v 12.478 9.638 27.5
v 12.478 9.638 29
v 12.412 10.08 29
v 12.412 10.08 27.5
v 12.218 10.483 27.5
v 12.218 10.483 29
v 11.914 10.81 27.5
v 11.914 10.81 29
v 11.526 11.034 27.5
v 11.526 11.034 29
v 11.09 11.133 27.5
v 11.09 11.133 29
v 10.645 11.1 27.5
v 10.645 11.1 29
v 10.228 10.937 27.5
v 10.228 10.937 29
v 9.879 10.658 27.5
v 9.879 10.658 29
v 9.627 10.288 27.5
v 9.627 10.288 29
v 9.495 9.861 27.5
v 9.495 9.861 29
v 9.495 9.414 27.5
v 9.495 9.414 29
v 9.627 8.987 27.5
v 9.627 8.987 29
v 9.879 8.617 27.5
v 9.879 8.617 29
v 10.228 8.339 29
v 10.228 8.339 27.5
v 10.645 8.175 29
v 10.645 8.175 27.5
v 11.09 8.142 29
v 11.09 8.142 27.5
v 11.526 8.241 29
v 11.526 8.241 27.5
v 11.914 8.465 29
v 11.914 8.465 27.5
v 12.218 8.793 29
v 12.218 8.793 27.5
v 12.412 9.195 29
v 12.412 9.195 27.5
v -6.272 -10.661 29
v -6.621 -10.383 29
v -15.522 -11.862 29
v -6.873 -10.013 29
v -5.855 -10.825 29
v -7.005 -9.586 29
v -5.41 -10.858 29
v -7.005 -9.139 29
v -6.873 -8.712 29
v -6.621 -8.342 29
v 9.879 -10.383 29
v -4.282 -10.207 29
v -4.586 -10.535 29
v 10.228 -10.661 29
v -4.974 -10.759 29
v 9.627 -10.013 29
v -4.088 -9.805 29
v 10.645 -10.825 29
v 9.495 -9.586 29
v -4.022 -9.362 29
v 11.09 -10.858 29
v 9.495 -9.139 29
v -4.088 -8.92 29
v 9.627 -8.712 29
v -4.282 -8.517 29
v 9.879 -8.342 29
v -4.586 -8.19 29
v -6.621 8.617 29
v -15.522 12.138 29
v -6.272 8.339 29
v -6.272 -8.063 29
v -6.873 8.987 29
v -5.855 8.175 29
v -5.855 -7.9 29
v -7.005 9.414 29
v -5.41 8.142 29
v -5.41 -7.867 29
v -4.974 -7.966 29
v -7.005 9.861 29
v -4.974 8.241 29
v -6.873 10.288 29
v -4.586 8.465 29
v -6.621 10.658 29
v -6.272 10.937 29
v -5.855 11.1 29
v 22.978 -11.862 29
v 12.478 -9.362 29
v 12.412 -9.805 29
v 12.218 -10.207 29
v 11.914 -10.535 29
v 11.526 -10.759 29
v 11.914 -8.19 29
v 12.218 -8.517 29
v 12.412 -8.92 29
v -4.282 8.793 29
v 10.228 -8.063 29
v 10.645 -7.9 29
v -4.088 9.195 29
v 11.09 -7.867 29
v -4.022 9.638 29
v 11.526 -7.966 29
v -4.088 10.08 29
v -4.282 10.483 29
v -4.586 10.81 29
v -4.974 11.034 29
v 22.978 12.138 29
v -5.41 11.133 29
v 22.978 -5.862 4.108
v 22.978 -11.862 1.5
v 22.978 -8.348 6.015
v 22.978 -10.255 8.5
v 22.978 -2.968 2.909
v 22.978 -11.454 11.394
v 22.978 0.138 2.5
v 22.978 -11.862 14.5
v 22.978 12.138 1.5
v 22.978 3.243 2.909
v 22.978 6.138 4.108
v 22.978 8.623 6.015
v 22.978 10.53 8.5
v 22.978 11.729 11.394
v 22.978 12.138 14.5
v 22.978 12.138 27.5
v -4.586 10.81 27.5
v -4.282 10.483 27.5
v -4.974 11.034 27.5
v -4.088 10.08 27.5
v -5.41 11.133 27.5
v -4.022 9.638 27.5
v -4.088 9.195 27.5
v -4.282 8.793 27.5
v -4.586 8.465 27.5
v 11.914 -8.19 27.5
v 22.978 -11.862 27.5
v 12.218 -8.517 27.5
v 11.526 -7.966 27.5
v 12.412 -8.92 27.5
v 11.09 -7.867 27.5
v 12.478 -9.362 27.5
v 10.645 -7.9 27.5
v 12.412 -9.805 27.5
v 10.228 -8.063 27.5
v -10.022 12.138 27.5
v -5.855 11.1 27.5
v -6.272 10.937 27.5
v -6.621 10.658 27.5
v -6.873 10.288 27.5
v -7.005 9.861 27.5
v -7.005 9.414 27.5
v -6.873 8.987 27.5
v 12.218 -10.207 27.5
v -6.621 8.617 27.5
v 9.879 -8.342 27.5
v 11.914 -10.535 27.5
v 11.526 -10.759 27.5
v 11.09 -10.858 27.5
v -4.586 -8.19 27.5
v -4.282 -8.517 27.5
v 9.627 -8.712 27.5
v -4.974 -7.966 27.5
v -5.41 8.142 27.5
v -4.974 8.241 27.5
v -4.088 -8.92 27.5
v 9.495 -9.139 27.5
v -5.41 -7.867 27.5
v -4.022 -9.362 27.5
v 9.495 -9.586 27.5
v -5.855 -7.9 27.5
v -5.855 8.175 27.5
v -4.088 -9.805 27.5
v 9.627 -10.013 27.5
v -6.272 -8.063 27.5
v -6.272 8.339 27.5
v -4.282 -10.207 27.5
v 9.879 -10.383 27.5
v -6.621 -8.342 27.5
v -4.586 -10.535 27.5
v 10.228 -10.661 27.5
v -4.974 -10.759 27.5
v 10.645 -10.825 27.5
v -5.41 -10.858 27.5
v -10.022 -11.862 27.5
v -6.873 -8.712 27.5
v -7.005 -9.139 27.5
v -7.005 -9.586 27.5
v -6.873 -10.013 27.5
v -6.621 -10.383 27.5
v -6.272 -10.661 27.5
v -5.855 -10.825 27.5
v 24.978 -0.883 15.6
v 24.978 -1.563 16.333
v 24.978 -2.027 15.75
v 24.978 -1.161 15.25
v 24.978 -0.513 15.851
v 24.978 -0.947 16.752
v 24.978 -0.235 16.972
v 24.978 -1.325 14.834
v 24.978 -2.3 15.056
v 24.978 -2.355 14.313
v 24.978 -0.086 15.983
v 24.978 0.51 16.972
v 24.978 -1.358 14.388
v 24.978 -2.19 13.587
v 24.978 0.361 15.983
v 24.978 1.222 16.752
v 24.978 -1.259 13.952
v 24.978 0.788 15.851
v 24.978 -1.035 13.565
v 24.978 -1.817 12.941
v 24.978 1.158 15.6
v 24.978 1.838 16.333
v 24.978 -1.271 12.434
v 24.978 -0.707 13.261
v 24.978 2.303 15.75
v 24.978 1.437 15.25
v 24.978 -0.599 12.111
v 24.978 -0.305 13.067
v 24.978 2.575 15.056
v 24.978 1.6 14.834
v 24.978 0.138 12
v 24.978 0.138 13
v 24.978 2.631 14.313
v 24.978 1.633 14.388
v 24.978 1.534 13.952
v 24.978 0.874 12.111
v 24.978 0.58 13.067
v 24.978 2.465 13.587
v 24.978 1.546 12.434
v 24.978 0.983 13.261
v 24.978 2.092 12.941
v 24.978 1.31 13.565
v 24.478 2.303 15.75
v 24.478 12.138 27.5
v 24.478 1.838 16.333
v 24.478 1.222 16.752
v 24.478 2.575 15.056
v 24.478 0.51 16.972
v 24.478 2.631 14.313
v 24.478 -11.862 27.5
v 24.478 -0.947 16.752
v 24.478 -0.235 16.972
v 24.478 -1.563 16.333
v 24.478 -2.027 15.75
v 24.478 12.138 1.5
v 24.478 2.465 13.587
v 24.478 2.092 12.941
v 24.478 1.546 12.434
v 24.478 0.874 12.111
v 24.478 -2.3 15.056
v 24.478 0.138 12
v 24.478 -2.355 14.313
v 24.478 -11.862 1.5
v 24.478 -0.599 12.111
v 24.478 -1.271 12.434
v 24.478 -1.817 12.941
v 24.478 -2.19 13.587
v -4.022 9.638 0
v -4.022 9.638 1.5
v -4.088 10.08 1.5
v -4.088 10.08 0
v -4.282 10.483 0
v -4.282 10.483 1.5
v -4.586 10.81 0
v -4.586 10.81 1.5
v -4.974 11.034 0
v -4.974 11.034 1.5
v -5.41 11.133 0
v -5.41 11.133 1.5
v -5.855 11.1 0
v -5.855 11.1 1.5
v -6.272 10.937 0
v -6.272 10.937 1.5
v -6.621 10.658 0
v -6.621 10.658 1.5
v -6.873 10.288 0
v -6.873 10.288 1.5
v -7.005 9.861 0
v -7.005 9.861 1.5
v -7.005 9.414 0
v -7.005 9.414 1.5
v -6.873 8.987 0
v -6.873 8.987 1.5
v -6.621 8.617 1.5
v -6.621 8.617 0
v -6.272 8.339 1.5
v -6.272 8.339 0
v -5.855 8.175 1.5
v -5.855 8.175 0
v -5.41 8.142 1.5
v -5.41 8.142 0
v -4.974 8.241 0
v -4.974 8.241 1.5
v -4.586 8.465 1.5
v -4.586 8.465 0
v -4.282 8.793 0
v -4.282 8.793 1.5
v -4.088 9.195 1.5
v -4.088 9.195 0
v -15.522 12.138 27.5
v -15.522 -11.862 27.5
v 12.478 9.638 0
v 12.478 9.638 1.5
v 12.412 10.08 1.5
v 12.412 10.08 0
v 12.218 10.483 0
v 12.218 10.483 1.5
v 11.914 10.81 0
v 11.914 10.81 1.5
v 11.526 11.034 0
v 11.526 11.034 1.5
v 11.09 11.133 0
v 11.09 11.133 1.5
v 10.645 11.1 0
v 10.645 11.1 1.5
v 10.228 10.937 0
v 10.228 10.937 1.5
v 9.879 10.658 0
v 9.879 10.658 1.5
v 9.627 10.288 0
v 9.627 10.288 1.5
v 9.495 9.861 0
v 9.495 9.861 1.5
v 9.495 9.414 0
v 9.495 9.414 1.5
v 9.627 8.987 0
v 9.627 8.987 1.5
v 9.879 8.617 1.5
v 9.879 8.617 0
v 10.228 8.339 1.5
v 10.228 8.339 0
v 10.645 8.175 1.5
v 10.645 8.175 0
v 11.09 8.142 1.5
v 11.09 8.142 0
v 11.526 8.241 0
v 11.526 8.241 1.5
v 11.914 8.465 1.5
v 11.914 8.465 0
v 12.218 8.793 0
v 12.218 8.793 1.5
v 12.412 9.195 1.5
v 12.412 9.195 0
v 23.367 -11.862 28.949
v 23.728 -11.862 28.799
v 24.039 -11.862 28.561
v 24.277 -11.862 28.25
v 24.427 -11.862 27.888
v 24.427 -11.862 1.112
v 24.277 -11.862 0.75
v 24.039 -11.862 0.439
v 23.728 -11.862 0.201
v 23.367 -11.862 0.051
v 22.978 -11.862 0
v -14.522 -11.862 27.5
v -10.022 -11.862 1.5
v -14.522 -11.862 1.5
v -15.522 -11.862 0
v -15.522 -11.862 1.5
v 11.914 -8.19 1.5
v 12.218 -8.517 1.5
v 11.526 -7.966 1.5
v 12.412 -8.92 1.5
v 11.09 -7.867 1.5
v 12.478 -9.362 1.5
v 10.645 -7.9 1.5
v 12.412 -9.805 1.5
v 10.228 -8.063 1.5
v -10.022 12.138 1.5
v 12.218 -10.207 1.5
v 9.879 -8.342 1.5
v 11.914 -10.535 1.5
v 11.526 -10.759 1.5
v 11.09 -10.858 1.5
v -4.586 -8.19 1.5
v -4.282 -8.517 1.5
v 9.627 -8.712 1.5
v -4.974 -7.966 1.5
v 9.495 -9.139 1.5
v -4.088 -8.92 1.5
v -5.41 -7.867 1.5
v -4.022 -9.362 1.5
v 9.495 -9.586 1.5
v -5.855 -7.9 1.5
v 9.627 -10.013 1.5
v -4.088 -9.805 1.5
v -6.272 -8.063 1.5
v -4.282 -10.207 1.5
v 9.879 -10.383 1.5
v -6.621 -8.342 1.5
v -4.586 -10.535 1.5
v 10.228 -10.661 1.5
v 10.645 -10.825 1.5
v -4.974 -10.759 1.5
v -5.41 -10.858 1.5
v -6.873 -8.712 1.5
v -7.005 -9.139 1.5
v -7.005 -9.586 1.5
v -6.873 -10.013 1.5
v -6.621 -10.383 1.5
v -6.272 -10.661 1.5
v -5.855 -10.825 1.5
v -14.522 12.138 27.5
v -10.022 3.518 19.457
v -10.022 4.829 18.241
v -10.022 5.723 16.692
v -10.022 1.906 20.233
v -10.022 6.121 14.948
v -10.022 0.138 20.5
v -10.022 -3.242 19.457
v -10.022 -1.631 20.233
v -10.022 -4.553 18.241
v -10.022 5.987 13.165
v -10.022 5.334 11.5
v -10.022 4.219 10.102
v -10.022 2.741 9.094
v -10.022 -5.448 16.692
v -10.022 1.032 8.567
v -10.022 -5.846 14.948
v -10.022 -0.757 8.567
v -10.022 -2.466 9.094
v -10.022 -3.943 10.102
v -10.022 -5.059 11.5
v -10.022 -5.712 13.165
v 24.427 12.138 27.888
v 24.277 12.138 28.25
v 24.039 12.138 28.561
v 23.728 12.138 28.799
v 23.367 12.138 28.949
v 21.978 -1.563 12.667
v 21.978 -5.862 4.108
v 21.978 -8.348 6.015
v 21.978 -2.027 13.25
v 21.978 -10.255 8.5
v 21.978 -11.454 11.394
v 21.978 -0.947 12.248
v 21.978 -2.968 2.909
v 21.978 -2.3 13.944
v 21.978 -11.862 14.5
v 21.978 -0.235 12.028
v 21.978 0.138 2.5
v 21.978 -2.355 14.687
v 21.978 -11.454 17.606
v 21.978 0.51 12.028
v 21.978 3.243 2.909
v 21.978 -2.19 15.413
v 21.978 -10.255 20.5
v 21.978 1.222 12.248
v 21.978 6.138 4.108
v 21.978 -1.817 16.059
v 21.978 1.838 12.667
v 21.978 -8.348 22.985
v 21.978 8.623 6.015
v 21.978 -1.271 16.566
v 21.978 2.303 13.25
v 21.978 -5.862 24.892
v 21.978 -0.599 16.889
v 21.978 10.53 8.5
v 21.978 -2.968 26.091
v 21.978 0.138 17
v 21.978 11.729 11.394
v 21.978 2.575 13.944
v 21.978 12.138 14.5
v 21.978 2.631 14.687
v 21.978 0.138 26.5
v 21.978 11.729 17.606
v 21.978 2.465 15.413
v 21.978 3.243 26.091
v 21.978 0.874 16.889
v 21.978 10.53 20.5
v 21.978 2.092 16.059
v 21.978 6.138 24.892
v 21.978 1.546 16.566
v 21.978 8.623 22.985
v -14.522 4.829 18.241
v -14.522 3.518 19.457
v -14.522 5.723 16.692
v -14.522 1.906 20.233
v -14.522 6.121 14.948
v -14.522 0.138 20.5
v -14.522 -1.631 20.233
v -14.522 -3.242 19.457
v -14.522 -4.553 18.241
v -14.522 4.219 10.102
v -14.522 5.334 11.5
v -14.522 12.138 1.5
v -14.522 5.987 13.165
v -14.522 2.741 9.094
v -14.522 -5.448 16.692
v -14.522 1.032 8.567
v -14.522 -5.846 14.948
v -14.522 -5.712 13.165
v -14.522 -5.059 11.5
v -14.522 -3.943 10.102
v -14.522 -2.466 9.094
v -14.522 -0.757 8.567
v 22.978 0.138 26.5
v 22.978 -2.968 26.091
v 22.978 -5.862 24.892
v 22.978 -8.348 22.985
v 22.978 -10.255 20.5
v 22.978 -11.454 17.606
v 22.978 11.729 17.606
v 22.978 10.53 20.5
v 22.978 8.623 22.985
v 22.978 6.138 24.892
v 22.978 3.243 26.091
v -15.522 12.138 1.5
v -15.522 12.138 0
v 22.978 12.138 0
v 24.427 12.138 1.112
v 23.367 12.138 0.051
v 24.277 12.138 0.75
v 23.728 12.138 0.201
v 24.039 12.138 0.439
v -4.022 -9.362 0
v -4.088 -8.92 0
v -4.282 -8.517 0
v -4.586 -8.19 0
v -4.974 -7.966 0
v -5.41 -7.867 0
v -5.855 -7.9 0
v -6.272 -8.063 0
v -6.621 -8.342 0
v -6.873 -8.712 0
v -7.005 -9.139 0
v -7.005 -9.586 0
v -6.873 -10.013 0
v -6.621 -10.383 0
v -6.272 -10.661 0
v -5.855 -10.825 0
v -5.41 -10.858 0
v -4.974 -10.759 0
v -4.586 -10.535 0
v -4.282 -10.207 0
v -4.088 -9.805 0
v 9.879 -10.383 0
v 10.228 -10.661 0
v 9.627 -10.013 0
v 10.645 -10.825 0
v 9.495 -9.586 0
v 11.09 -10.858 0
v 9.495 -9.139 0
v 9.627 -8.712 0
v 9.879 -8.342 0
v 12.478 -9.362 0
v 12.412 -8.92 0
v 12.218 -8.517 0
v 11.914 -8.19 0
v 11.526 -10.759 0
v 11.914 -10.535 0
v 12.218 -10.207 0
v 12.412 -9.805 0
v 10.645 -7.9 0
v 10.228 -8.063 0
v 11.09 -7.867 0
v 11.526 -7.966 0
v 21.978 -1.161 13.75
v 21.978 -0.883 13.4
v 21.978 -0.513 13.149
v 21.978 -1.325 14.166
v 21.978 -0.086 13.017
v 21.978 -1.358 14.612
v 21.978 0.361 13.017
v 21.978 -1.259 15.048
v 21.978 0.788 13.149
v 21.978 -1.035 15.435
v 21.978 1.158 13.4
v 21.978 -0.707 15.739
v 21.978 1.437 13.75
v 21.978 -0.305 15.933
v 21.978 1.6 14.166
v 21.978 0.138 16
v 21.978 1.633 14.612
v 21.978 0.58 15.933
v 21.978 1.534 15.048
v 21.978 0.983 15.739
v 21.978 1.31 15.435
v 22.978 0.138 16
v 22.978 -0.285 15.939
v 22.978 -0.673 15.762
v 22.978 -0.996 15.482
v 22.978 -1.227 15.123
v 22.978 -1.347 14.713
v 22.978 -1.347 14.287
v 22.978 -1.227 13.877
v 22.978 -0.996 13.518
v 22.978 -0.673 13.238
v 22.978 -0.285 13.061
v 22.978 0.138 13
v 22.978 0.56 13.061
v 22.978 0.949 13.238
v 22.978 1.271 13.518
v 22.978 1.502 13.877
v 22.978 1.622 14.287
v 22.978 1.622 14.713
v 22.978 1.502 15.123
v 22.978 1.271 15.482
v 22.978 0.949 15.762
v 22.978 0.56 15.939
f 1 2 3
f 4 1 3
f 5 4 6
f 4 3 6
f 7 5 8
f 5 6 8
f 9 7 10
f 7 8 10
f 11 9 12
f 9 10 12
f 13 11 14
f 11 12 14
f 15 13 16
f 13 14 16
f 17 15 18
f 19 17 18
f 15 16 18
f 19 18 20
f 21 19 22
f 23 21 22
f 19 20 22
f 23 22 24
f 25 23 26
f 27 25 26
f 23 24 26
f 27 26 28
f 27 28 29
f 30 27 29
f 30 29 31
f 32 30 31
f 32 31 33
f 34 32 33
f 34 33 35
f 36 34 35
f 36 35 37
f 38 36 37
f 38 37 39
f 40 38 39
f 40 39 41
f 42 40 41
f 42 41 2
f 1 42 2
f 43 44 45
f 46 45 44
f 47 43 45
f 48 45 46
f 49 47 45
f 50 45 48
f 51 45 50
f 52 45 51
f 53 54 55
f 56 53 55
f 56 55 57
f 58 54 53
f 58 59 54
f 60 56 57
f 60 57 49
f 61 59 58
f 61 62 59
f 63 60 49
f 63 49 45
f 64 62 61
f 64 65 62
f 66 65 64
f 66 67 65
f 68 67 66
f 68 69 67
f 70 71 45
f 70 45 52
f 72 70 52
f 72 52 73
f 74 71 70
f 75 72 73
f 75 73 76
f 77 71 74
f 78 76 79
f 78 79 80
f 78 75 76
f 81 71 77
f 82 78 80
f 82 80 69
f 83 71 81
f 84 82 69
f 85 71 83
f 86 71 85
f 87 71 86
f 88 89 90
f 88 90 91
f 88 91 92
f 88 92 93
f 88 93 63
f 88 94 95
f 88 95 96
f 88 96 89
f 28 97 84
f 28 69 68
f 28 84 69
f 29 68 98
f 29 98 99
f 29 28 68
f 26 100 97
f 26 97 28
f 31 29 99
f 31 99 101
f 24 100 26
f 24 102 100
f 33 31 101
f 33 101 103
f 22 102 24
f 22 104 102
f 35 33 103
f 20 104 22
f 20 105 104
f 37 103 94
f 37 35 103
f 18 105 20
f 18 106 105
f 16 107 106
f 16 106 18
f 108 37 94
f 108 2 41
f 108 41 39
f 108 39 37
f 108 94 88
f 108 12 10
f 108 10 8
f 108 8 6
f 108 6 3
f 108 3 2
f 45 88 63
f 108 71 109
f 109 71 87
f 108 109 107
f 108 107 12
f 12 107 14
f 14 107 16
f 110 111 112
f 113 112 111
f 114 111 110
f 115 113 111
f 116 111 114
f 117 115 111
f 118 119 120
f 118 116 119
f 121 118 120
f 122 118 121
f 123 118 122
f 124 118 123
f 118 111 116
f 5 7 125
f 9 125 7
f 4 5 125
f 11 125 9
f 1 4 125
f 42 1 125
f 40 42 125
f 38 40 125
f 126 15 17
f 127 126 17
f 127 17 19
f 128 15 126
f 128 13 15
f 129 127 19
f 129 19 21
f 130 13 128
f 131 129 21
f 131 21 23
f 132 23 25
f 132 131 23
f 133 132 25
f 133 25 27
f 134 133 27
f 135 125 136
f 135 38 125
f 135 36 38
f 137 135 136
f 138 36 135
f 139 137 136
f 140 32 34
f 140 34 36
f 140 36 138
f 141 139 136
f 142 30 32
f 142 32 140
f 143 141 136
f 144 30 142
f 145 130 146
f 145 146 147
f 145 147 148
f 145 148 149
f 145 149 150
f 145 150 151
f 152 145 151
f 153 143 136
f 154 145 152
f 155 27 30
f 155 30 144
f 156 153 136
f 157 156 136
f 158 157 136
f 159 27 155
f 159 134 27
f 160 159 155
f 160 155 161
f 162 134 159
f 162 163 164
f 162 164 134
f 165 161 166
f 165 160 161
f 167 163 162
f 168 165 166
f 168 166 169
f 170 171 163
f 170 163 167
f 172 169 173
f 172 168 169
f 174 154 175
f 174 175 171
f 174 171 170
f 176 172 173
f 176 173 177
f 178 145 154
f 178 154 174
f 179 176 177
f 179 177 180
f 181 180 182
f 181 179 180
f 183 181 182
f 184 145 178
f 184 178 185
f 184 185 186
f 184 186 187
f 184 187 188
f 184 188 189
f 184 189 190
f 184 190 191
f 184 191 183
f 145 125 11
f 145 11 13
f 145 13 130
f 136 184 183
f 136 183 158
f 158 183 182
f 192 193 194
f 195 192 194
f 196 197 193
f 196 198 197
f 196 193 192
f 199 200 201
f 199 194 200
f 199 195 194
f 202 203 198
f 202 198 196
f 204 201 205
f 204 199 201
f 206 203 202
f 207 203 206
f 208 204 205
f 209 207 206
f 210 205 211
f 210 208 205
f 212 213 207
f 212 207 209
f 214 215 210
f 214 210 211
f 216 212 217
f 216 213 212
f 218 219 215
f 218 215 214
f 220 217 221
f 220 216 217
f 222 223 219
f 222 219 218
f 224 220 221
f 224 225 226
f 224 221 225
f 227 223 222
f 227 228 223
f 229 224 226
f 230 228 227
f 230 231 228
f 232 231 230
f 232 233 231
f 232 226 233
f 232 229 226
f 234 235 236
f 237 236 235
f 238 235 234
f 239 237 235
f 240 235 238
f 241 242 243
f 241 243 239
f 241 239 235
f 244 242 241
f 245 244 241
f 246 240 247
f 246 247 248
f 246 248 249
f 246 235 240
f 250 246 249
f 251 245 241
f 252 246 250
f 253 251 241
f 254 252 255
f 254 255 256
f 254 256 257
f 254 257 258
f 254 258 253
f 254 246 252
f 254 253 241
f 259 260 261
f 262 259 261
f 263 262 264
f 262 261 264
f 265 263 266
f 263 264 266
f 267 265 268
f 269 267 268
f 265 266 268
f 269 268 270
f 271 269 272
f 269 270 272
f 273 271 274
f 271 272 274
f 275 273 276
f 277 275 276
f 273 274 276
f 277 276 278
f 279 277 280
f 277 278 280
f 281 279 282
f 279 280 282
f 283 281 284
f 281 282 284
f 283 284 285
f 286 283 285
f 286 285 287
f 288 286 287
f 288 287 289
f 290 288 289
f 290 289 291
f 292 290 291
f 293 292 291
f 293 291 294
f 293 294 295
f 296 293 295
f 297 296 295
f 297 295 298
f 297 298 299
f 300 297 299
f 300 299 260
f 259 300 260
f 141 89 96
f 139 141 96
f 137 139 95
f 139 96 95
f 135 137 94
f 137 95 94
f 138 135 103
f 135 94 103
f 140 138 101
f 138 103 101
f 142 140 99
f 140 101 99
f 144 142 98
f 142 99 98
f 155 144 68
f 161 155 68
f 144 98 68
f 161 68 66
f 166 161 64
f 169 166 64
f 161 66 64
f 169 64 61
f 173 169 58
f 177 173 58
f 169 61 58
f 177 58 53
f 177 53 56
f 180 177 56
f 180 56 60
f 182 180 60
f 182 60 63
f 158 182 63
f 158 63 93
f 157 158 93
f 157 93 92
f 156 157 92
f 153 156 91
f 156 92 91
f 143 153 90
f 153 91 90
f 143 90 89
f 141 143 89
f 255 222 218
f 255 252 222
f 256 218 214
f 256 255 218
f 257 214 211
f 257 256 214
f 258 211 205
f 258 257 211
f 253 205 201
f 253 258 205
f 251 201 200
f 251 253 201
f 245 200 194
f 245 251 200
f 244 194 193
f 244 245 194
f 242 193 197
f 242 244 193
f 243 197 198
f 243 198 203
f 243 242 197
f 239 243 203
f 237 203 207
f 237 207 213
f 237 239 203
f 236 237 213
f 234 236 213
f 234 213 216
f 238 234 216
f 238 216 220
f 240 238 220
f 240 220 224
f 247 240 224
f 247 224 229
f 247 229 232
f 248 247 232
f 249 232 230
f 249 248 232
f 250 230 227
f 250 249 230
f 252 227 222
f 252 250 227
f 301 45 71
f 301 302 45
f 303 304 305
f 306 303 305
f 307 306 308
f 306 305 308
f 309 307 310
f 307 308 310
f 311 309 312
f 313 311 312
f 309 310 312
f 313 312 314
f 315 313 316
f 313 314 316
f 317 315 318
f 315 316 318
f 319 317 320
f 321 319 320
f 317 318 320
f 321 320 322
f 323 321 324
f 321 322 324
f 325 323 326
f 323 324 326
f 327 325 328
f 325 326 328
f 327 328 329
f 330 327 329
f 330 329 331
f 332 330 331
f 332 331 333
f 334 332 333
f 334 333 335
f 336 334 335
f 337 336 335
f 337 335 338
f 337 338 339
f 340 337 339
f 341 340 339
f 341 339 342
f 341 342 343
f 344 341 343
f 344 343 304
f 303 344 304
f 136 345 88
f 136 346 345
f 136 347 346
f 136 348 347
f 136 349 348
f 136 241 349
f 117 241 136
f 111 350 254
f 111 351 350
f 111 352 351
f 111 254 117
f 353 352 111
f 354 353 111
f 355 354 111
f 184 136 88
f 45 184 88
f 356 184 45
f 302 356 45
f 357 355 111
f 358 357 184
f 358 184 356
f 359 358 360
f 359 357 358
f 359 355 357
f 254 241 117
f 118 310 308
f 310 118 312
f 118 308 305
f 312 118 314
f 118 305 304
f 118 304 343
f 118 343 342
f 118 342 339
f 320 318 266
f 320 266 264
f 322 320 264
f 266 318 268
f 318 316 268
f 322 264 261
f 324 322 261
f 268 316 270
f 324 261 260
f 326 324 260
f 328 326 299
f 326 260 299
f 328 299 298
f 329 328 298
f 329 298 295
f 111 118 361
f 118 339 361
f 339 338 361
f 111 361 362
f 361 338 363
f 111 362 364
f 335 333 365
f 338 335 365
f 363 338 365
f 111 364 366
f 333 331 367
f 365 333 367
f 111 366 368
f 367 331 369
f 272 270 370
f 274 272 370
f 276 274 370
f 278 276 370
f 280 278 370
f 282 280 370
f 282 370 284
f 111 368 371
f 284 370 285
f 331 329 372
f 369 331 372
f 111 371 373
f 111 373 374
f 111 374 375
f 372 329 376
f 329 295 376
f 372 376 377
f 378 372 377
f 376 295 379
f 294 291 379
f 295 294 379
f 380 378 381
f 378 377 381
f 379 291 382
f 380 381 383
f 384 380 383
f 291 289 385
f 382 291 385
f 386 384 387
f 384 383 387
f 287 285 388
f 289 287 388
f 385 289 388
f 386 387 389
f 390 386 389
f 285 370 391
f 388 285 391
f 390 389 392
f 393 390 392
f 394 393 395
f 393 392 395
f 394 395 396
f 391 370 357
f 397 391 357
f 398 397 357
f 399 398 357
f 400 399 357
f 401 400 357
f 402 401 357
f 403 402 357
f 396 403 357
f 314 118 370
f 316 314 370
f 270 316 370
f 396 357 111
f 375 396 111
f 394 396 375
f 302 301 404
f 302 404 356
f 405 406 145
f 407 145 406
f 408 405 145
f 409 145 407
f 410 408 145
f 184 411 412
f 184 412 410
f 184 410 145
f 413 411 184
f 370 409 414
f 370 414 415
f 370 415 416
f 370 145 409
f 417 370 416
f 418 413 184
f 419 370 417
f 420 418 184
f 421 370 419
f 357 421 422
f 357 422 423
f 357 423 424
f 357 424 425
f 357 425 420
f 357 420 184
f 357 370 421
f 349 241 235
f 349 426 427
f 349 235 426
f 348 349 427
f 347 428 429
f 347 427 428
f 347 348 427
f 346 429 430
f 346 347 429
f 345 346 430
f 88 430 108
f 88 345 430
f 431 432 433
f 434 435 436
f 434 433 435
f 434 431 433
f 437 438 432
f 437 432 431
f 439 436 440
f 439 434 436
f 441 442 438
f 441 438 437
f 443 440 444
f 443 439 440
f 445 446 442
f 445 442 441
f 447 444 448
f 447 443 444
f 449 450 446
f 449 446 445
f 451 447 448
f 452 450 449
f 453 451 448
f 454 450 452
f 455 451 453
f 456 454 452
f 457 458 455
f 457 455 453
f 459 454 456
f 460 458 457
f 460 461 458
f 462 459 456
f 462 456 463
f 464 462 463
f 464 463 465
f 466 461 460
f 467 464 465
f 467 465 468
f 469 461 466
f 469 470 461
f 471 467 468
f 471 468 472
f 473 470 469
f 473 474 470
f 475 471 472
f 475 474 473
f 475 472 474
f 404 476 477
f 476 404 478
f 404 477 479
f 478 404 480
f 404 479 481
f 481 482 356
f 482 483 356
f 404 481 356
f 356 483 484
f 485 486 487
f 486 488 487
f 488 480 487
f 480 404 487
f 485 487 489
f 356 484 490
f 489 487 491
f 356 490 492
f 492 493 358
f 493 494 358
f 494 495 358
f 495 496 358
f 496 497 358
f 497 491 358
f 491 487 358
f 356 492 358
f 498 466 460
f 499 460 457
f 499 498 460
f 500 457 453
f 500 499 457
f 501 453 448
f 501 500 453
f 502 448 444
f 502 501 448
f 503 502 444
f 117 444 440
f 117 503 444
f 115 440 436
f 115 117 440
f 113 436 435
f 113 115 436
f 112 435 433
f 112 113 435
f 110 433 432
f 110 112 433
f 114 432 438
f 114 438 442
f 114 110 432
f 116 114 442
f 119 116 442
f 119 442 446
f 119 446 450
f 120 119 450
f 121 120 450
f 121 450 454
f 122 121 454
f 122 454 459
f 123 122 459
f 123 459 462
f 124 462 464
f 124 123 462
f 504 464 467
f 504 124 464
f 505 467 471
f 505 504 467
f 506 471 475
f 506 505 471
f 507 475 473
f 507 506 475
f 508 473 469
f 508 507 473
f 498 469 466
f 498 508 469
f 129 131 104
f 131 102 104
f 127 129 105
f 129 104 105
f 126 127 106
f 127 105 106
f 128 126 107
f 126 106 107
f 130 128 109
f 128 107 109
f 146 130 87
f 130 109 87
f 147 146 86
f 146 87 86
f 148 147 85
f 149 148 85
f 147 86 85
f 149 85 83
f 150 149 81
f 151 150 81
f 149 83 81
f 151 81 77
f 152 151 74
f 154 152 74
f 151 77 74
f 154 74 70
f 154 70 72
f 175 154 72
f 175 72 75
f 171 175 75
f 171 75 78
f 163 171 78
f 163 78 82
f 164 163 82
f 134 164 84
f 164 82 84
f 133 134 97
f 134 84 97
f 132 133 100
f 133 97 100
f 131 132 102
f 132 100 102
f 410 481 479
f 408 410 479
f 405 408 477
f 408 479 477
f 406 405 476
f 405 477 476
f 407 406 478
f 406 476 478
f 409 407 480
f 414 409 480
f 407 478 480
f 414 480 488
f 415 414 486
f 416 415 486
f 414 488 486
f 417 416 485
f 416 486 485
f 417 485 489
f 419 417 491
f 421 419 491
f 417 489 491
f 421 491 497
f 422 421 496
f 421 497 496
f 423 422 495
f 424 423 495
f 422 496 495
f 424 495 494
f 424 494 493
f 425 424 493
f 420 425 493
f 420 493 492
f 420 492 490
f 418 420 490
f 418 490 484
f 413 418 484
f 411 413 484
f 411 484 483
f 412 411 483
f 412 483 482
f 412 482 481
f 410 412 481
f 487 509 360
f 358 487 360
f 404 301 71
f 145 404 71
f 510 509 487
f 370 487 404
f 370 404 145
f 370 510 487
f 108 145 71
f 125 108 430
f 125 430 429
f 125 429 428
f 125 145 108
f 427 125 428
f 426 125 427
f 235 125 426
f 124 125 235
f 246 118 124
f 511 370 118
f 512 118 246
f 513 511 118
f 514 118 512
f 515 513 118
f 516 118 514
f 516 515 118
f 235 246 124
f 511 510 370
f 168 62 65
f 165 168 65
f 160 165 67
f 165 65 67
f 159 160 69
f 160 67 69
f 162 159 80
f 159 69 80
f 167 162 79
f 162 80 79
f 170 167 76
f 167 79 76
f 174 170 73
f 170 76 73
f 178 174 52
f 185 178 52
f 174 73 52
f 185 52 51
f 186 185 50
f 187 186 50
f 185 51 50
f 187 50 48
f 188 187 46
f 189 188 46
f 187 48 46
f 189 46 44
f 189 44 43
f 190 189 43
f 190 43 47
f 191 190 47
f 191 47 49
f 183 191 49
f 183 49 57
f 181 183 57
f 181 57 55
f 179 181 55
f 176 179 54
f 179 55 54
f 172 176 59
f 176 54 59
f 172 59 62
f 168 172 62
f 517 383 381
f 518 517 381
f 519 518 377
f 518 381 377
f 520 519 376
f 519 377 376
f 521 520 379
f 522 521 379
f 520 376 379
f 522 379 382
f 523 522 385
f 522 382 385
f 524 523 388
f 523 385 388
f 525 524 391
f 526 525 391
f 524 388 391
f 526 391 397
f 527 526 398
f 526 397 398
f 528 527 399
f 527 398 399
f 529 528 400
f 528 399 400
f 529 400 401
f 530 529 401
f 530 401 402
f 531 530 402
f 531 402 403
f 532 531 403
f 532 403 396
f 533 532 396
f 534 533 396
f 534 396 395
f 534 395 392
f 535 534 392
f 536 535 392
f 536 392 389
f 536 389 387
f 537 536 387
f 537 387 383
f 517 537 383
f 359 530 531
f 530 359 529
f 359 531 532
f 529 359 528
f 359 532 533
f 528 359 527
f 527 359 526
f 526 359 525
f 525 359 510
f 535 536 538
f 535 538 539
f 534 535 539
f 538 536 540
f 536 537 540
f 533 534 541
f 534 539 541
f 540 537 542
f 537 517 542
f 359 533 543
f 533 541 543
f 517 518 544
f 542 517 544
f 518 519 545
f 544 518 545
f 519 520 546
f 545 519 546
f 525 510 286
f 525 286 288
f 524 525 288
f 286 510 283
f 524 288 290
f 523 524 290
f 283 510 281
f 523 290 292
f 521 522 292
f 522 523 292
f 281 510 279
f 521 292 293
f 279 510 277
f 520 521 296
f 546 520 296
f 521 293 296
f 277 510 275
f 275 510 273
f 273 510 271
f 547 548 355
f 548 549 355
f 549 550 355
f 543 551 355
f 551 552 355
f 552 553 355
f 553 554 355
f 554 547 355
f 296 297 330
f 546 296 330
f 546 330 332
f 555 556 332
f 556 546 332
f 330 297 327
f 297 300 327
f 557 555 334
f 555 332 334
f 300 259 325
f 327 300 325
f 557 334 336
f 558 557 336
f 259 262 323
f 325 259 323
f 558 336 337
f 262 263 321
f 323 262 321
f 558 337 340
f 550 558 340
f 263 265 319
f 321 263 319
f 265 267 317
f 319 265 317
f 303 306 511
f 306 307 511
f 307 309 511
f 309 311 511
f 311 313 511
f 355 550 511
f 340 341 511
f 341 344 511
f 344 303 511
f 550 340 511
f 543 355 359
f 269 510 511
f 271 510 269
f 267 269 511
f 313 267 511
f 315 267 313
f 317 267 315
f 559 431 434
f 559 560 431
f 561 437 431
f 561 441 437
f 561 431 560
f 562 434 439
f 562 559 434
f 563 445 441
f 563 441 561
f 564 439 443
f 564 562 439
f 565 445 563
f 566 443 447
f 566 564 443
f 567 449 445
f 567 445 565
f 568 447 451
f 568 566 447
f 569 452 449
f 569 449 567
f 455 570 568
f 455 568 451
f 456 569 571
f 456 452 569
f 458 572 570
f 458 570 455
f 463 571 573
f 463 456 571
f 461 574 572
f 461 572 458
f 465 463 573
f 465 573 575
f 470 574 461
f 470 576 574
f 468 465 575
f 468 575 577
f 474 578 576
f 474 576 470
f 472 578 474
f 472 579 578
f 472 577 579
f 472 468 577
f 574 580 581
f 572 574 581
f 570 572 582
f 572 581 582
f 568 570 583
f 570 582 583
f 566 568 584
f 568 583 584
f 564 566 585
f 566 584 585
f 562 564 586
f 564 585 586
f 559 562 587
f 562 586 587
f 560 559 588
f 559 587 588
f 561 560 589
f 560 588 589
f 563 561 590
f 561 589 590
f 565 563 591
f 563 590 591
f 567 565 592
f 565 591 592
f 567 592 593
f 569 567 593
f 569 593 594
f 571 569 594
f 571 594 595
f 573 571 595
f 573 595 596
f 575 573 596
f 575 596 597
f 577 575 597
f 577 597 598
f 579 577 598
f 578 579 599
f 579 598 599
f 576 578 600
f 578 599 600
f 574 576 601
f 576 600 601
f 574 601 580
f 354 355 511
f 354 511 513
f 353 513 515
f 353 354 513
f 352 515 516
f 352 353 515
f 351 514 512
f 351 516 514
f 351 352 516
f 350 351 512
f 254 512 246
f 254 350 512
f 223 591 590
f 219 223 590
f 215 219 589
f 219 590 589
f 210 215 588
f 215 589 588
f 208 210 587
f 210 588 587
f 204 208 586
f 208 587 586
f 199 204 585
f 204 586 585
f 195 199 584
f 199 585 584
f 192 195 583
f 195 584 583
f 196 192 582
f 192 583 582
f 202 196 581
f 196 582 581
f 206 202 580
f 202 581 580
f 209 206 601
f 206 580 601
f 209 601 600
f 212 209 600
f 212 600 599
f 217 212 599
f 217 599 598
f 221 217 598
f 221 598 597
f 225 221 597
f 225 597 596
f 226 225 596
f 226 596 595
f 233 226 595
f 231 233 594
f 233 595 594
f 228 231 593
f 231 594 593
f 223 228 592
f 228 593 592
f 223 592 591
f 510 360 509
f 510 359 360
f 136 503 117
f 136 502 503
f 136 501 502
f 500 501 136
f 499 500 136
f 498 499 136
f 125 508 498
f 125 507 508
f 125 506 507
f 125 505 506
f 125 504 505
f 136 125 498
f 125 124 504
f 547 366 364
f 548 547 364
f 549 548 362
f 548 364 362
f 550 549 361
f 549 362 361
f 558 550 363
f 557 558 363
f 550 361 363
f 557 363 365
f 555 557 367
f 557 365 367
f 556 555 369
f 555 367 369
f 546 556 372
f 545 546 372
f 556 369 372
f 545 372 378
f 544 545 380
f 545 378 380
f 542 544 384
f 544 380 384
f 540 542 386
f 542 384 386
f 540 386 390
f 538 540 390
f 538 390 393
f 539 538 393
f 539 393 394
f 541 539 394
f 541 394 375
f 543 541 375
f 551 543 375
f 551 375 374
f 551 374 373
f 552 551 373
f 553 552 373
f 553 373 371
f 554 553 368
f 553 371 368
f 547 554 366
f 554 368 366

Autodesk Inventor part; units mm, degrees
ref_plane "YZ Plane" through (0, 0, 0) normal (1, 0, 0) x (0, 1, 0)
ref_plane "XZ Plane" through (0, 0, 0) normal (0, 1, 0) x (-1, 0, 0)
ref_plane "XY Plane" through (0, 0, 0) normal (0, 0, 1) x (1, 0, 0)
sketch "Sketch1" plane through (0, 0, 0) normal (0, 0, 1) x (1, 0, 0)
  line L0 (-15.5217, 12.1376) -> (24.4783, 12.1376)
  line L1 (24.4783, 12.1376) -> (24.4783, -11.8624)
  line L2 (24.4783, -11.8624) -> (-15.5217, -11.8624)
  line L3 (-15.5217, -11.8624) -> (-15.5217, 12.1376)
  point P0 (0, 0)
  dimension "d0" = 40
  dimension "d1" = 24
extrude "Extrusion1" add sketch "Sketch1" along normal blind 29
sketch "Sketch2" plane through (-15.5217, -11.8624, 0) normal (-1, 0, 0) x (0, 0, 1)
  line L0 (0, 0) -> (0, 24) projected
  line L1 (0, 0) -> (29, 0) projected
  line L2 (0, 24) -> (1.5, 24)
  line L3 (1.5, 24) -> (1.5, 0)
  line L4 (1.5, 0) -> (0, 0)
  line L5 (0, 0) -> (0, 24)
  line L6 (0, 24) -> (29, 24) projected
  line L7 (29, 24) -> (27.5, 24)
  line L8 (27.5, 24) -> (27.5, 0)
  line L9 (27.5, 0) -> (29, 0)
  line L10 (29, 0) -> (29, 24)
  line L11 (1.5, 24) -> (27.5, 24)
  line L12 (27.5, 24) -> (27.5, 0)
  line L13 (27.5, 0) -> (1.5, 0)
  line L14 (1.5, 0) -> (1.5, 24)
  point P0 (0, 11.8624)
  dimension "d4" = 1.5
  dimension "d5" = 1.5
  dimension "d6" = 24
extrude "Extrusion2" cut sketch "Sketch2" against normal blind 38.5 contours L3 L6 L8 L1
sketch "Sketch3" plane through (24.4783, -11.8624, 0) normal (1, 0, 0) x (0, 0, -1)
  line L0 (0, 24) -> (-29, 24) projected
  line L1 (0, 24) -> (0, 0) projected
  line L2 (-29, 0) -> (-29, 24) projected
  circle A0 centre (-14.5, 12) radius 1.5
  circle A1 centre (-14.5, 12) radius 2.5
  line L3 (0, 24) -> (-12.574, 13.5939)
  line L4 (-16.426, 10.4061) -> (-29, 0)
  line L5 (-29, 24) -> (-16.426, 13.5939)
  line L6 (-12.574, 10.4061) -> (0, 0)
  point P0 (0, 11.8624)
  dimension "d9" = 3
  dimension "d10" = 5
extrude "Extrusion3" add sketch "Sketch3" along normal blind 0.5 contours A1
sketch "Sketch4" plane through (24.4783, -11.8624, 0) normal (1, 0, 0) x (0, 0, -1)
  line L0 (0, 24) -> (0, 0) projected
  line L1 (0, 0) -> (-29, 0) projected
  line L2 (0, 24) -> (-29, 0)
  line L3 (0, 24) -> (-29, 24) projected
  line L4 (-29, 24) -> (0, 0)
  circle A0 centre (-14.5, 12) radius 1.5 projected
  circle A1 centre (-14.5, 12) radius 1.5
  point P0 (0, 11.8624)
  dimension "d13" = 3
extrude "Extrusion4" cut sketch "Sketch4" against normal blind 1.5 contours A0 L4 L2 | L2 L4 A0 | A0 L2 L4 | L2 A0 L4
sketch "Sketch5" plane through (-15.5217, -11.8624, 1.5) normal (0, 0, 1) x (1, 0, 0)
  line L0 (0, 24) -> (40, 24) projected
  line L1 (0, 24) -> (1, 24)
  line L2 (1, 24) -> (1, 0)
  line L3 (1, 0) -> (0, 0)
  line L4 (0, 0) -> (0, 24)
  line L5 (1, 24) -> (5.5, 24)
  line L6 (5.5, 24) -> (5.5, 0)
  line L7 (5.5, 0) -> (1, 0)
  line L8 (1, 0) -> (1, 24)
  point P0 (15.5217, 11.8624)
  dimension "d16" = 1
  dimension "d17" = 24
  dimension "d18" = 4.5
  dimension "d19" = 24
extrude "Extrusion5" add sketch "Sketch5" along normal blind 26 contours L0 L6 L7 L2
sketch "Sketch6" plane through (-14.5217, -11.8624, 1.5) normal (-1, 0, 0) x (0, 0, 1)
  line L0 (26, 24) -> (26, 0) projected
  line L1 (-1.5, 24) -> (27.5, 24) projected
  line L2 (26, 0) -> (0, 0) projected
  circle A0 centre (13, 12) radius 6
  line L3 (0, 24) -> (8.5912, 16.0697)
  line L4 (17.4088, 7.9303) -> (26, 0)
  line L5 (26, 24) -> (17.4088, 16.0697)
  line L6 (8.5912, 7.9303) -> (0, 0)
  point P0 (-1.5, 11.8624)
  dimension "d22" = 12
extrude "Extrusion6" cut sketch "Sketch6" against normal blind 4.5 contours A0
sketch "Sketch7" plane through (22.9783, -11.8624, 0) normal (-1, 0, 0) x (0, 0, 1)
  line L0 (27.5, 0) -> (1.5, 0) projected
  line L1 (27.5, 24) -> (1.5, 0)
  line L2 (1.5, 0) -> (1.5, 24)
  line L3 (1.5, 24) -> (27.5, 0)
  circle A0 centre (14.5, 12) radius 2.5 projected
  circle A1 centre (14.5, 12) radius 12
  point P0 (0, 11.8624)
extrude "Extrusion7" add sketch "Sketch7" along normal blind 1 contours A1 L1 A0 L3 | L3 A0 L1 A1 | A1 L3 A0 L1 | A1 L1 A0 L3
fillet "Fillet1" radius 1.5 1 edges at (24.4783, 0.1376, 29)
fillet "Fillet2" radius 1.5 1 edges at (24.4783, 0.1376, 0)
sketch "Sketch8" plane through (0, 0, 29) normal (0, 0, 1) x (1, 0, 0)
  line L0 (-15.5217, -11.8624) -> (-15.5217, 12.1376) projected
  line L1 (-15.5217, 12.1376) -> (-5.5217, 12.1376)
  line L2 (-5.5217, 12.1376) -> (-5.5217, -11.8624)
  line L3 (-5.5217, -11.8624) -> (-15.5217, -11.8624)
  line L4 (-15.5217, -11.8624) -> (-15.5217, 12.1376)
  line L5 (-15.5217, 12.1376) -> (-5.5217, 12.1376)
  line L6 (-7.0217, -9.3624) -> (-15.5217, -9.3624)
  line L7 (-15.5217, -9.3624) -> (-15.5217, 12.1376)
  line L8 (-5.5217, -11.8624) -> (-15.5217, -11.8624)
  line L9 (-15.5217, -11.8624) -> (-15.5217, 9.6376)
  line L10 (-15.5217, 9.6376) -> (-7.0217, 9.6376)
  line L11 (-5.5217, 9.6376) -> (-5.5217, -11.8624)
  circle A0 centre (-5.5217, 9.6376) radius 1.5
  circle A1 centre (-5.5217, -9.3624) radius 1.5
  line L12 (-5.5217, 12.1376) -> (-5.5217, 9.6376)
  line L13 (-5.5217, 8.1376) -> (-5.5217, -9.3624)
  point P0 (0, 0)
  dimension "d35" = 3
  dimension "d29" = 10
  dimension "d30" = 24
  dimension "d31" = 10
  dimension "d32" = 21.5
  dimension "d33" = 21.5
  dimension "d34" = 3
extrude "Extrusion8" cut sketch "Sketch8" against normal blind 29 contours A1 L2 | L2 A1 | A0 L2 | L2 A0
sketch "Sketch9" plane through (0, 0, 29) normal (0, 0, 1) x (1, 0, 0)
  line L0 (-15.5217, 12.1376) -> (-15.5217, -11.8624) projected
  line L1 (-15.5217, 12.1376) -> (10.9783, 12.1376)
  line L2 (10.9783, 12.1376) -> (10.9783, -9.3624)
  line L3 (10.9783, -9.3624) -> (-15.5217, -9.3624)
  line L4 (-15.5217, -9.3624) -> (-15.5217, 12.1376)
  line L5 (10.9783, 12.1376) -> (10.9783, 10.0118)
  circle A0 centre (10.9783, -9.3624) radius 1.5
  circle A1 centre (10.9783, 9.6376) radius 1.5
  point P0 (0, 0)
  dimension "d38" = 26.5
  dimension "d39" = 3
  dimension "d40" = 3
extrude "Extrusion9" cut sketch "Sketch9" against normal blind 29 contours A0 L2 L3 | L3 L2 A0 | A1 L2 | L2 A1
sketch "Sketch10" plane through (22.9783, 0.1376, 14.5) normal (-1, 0, 0) x (0, 0, 1)
  circle A0 centre (0, 0) radius 1.5 projected
  circle A1 centre (0, 0) radius 2.5
  point P0 (-14.5, -0.1376)
  dimension "d43" = 5
extrude "Extrusion10" add sketch "Sketch10" along normal blind 1
